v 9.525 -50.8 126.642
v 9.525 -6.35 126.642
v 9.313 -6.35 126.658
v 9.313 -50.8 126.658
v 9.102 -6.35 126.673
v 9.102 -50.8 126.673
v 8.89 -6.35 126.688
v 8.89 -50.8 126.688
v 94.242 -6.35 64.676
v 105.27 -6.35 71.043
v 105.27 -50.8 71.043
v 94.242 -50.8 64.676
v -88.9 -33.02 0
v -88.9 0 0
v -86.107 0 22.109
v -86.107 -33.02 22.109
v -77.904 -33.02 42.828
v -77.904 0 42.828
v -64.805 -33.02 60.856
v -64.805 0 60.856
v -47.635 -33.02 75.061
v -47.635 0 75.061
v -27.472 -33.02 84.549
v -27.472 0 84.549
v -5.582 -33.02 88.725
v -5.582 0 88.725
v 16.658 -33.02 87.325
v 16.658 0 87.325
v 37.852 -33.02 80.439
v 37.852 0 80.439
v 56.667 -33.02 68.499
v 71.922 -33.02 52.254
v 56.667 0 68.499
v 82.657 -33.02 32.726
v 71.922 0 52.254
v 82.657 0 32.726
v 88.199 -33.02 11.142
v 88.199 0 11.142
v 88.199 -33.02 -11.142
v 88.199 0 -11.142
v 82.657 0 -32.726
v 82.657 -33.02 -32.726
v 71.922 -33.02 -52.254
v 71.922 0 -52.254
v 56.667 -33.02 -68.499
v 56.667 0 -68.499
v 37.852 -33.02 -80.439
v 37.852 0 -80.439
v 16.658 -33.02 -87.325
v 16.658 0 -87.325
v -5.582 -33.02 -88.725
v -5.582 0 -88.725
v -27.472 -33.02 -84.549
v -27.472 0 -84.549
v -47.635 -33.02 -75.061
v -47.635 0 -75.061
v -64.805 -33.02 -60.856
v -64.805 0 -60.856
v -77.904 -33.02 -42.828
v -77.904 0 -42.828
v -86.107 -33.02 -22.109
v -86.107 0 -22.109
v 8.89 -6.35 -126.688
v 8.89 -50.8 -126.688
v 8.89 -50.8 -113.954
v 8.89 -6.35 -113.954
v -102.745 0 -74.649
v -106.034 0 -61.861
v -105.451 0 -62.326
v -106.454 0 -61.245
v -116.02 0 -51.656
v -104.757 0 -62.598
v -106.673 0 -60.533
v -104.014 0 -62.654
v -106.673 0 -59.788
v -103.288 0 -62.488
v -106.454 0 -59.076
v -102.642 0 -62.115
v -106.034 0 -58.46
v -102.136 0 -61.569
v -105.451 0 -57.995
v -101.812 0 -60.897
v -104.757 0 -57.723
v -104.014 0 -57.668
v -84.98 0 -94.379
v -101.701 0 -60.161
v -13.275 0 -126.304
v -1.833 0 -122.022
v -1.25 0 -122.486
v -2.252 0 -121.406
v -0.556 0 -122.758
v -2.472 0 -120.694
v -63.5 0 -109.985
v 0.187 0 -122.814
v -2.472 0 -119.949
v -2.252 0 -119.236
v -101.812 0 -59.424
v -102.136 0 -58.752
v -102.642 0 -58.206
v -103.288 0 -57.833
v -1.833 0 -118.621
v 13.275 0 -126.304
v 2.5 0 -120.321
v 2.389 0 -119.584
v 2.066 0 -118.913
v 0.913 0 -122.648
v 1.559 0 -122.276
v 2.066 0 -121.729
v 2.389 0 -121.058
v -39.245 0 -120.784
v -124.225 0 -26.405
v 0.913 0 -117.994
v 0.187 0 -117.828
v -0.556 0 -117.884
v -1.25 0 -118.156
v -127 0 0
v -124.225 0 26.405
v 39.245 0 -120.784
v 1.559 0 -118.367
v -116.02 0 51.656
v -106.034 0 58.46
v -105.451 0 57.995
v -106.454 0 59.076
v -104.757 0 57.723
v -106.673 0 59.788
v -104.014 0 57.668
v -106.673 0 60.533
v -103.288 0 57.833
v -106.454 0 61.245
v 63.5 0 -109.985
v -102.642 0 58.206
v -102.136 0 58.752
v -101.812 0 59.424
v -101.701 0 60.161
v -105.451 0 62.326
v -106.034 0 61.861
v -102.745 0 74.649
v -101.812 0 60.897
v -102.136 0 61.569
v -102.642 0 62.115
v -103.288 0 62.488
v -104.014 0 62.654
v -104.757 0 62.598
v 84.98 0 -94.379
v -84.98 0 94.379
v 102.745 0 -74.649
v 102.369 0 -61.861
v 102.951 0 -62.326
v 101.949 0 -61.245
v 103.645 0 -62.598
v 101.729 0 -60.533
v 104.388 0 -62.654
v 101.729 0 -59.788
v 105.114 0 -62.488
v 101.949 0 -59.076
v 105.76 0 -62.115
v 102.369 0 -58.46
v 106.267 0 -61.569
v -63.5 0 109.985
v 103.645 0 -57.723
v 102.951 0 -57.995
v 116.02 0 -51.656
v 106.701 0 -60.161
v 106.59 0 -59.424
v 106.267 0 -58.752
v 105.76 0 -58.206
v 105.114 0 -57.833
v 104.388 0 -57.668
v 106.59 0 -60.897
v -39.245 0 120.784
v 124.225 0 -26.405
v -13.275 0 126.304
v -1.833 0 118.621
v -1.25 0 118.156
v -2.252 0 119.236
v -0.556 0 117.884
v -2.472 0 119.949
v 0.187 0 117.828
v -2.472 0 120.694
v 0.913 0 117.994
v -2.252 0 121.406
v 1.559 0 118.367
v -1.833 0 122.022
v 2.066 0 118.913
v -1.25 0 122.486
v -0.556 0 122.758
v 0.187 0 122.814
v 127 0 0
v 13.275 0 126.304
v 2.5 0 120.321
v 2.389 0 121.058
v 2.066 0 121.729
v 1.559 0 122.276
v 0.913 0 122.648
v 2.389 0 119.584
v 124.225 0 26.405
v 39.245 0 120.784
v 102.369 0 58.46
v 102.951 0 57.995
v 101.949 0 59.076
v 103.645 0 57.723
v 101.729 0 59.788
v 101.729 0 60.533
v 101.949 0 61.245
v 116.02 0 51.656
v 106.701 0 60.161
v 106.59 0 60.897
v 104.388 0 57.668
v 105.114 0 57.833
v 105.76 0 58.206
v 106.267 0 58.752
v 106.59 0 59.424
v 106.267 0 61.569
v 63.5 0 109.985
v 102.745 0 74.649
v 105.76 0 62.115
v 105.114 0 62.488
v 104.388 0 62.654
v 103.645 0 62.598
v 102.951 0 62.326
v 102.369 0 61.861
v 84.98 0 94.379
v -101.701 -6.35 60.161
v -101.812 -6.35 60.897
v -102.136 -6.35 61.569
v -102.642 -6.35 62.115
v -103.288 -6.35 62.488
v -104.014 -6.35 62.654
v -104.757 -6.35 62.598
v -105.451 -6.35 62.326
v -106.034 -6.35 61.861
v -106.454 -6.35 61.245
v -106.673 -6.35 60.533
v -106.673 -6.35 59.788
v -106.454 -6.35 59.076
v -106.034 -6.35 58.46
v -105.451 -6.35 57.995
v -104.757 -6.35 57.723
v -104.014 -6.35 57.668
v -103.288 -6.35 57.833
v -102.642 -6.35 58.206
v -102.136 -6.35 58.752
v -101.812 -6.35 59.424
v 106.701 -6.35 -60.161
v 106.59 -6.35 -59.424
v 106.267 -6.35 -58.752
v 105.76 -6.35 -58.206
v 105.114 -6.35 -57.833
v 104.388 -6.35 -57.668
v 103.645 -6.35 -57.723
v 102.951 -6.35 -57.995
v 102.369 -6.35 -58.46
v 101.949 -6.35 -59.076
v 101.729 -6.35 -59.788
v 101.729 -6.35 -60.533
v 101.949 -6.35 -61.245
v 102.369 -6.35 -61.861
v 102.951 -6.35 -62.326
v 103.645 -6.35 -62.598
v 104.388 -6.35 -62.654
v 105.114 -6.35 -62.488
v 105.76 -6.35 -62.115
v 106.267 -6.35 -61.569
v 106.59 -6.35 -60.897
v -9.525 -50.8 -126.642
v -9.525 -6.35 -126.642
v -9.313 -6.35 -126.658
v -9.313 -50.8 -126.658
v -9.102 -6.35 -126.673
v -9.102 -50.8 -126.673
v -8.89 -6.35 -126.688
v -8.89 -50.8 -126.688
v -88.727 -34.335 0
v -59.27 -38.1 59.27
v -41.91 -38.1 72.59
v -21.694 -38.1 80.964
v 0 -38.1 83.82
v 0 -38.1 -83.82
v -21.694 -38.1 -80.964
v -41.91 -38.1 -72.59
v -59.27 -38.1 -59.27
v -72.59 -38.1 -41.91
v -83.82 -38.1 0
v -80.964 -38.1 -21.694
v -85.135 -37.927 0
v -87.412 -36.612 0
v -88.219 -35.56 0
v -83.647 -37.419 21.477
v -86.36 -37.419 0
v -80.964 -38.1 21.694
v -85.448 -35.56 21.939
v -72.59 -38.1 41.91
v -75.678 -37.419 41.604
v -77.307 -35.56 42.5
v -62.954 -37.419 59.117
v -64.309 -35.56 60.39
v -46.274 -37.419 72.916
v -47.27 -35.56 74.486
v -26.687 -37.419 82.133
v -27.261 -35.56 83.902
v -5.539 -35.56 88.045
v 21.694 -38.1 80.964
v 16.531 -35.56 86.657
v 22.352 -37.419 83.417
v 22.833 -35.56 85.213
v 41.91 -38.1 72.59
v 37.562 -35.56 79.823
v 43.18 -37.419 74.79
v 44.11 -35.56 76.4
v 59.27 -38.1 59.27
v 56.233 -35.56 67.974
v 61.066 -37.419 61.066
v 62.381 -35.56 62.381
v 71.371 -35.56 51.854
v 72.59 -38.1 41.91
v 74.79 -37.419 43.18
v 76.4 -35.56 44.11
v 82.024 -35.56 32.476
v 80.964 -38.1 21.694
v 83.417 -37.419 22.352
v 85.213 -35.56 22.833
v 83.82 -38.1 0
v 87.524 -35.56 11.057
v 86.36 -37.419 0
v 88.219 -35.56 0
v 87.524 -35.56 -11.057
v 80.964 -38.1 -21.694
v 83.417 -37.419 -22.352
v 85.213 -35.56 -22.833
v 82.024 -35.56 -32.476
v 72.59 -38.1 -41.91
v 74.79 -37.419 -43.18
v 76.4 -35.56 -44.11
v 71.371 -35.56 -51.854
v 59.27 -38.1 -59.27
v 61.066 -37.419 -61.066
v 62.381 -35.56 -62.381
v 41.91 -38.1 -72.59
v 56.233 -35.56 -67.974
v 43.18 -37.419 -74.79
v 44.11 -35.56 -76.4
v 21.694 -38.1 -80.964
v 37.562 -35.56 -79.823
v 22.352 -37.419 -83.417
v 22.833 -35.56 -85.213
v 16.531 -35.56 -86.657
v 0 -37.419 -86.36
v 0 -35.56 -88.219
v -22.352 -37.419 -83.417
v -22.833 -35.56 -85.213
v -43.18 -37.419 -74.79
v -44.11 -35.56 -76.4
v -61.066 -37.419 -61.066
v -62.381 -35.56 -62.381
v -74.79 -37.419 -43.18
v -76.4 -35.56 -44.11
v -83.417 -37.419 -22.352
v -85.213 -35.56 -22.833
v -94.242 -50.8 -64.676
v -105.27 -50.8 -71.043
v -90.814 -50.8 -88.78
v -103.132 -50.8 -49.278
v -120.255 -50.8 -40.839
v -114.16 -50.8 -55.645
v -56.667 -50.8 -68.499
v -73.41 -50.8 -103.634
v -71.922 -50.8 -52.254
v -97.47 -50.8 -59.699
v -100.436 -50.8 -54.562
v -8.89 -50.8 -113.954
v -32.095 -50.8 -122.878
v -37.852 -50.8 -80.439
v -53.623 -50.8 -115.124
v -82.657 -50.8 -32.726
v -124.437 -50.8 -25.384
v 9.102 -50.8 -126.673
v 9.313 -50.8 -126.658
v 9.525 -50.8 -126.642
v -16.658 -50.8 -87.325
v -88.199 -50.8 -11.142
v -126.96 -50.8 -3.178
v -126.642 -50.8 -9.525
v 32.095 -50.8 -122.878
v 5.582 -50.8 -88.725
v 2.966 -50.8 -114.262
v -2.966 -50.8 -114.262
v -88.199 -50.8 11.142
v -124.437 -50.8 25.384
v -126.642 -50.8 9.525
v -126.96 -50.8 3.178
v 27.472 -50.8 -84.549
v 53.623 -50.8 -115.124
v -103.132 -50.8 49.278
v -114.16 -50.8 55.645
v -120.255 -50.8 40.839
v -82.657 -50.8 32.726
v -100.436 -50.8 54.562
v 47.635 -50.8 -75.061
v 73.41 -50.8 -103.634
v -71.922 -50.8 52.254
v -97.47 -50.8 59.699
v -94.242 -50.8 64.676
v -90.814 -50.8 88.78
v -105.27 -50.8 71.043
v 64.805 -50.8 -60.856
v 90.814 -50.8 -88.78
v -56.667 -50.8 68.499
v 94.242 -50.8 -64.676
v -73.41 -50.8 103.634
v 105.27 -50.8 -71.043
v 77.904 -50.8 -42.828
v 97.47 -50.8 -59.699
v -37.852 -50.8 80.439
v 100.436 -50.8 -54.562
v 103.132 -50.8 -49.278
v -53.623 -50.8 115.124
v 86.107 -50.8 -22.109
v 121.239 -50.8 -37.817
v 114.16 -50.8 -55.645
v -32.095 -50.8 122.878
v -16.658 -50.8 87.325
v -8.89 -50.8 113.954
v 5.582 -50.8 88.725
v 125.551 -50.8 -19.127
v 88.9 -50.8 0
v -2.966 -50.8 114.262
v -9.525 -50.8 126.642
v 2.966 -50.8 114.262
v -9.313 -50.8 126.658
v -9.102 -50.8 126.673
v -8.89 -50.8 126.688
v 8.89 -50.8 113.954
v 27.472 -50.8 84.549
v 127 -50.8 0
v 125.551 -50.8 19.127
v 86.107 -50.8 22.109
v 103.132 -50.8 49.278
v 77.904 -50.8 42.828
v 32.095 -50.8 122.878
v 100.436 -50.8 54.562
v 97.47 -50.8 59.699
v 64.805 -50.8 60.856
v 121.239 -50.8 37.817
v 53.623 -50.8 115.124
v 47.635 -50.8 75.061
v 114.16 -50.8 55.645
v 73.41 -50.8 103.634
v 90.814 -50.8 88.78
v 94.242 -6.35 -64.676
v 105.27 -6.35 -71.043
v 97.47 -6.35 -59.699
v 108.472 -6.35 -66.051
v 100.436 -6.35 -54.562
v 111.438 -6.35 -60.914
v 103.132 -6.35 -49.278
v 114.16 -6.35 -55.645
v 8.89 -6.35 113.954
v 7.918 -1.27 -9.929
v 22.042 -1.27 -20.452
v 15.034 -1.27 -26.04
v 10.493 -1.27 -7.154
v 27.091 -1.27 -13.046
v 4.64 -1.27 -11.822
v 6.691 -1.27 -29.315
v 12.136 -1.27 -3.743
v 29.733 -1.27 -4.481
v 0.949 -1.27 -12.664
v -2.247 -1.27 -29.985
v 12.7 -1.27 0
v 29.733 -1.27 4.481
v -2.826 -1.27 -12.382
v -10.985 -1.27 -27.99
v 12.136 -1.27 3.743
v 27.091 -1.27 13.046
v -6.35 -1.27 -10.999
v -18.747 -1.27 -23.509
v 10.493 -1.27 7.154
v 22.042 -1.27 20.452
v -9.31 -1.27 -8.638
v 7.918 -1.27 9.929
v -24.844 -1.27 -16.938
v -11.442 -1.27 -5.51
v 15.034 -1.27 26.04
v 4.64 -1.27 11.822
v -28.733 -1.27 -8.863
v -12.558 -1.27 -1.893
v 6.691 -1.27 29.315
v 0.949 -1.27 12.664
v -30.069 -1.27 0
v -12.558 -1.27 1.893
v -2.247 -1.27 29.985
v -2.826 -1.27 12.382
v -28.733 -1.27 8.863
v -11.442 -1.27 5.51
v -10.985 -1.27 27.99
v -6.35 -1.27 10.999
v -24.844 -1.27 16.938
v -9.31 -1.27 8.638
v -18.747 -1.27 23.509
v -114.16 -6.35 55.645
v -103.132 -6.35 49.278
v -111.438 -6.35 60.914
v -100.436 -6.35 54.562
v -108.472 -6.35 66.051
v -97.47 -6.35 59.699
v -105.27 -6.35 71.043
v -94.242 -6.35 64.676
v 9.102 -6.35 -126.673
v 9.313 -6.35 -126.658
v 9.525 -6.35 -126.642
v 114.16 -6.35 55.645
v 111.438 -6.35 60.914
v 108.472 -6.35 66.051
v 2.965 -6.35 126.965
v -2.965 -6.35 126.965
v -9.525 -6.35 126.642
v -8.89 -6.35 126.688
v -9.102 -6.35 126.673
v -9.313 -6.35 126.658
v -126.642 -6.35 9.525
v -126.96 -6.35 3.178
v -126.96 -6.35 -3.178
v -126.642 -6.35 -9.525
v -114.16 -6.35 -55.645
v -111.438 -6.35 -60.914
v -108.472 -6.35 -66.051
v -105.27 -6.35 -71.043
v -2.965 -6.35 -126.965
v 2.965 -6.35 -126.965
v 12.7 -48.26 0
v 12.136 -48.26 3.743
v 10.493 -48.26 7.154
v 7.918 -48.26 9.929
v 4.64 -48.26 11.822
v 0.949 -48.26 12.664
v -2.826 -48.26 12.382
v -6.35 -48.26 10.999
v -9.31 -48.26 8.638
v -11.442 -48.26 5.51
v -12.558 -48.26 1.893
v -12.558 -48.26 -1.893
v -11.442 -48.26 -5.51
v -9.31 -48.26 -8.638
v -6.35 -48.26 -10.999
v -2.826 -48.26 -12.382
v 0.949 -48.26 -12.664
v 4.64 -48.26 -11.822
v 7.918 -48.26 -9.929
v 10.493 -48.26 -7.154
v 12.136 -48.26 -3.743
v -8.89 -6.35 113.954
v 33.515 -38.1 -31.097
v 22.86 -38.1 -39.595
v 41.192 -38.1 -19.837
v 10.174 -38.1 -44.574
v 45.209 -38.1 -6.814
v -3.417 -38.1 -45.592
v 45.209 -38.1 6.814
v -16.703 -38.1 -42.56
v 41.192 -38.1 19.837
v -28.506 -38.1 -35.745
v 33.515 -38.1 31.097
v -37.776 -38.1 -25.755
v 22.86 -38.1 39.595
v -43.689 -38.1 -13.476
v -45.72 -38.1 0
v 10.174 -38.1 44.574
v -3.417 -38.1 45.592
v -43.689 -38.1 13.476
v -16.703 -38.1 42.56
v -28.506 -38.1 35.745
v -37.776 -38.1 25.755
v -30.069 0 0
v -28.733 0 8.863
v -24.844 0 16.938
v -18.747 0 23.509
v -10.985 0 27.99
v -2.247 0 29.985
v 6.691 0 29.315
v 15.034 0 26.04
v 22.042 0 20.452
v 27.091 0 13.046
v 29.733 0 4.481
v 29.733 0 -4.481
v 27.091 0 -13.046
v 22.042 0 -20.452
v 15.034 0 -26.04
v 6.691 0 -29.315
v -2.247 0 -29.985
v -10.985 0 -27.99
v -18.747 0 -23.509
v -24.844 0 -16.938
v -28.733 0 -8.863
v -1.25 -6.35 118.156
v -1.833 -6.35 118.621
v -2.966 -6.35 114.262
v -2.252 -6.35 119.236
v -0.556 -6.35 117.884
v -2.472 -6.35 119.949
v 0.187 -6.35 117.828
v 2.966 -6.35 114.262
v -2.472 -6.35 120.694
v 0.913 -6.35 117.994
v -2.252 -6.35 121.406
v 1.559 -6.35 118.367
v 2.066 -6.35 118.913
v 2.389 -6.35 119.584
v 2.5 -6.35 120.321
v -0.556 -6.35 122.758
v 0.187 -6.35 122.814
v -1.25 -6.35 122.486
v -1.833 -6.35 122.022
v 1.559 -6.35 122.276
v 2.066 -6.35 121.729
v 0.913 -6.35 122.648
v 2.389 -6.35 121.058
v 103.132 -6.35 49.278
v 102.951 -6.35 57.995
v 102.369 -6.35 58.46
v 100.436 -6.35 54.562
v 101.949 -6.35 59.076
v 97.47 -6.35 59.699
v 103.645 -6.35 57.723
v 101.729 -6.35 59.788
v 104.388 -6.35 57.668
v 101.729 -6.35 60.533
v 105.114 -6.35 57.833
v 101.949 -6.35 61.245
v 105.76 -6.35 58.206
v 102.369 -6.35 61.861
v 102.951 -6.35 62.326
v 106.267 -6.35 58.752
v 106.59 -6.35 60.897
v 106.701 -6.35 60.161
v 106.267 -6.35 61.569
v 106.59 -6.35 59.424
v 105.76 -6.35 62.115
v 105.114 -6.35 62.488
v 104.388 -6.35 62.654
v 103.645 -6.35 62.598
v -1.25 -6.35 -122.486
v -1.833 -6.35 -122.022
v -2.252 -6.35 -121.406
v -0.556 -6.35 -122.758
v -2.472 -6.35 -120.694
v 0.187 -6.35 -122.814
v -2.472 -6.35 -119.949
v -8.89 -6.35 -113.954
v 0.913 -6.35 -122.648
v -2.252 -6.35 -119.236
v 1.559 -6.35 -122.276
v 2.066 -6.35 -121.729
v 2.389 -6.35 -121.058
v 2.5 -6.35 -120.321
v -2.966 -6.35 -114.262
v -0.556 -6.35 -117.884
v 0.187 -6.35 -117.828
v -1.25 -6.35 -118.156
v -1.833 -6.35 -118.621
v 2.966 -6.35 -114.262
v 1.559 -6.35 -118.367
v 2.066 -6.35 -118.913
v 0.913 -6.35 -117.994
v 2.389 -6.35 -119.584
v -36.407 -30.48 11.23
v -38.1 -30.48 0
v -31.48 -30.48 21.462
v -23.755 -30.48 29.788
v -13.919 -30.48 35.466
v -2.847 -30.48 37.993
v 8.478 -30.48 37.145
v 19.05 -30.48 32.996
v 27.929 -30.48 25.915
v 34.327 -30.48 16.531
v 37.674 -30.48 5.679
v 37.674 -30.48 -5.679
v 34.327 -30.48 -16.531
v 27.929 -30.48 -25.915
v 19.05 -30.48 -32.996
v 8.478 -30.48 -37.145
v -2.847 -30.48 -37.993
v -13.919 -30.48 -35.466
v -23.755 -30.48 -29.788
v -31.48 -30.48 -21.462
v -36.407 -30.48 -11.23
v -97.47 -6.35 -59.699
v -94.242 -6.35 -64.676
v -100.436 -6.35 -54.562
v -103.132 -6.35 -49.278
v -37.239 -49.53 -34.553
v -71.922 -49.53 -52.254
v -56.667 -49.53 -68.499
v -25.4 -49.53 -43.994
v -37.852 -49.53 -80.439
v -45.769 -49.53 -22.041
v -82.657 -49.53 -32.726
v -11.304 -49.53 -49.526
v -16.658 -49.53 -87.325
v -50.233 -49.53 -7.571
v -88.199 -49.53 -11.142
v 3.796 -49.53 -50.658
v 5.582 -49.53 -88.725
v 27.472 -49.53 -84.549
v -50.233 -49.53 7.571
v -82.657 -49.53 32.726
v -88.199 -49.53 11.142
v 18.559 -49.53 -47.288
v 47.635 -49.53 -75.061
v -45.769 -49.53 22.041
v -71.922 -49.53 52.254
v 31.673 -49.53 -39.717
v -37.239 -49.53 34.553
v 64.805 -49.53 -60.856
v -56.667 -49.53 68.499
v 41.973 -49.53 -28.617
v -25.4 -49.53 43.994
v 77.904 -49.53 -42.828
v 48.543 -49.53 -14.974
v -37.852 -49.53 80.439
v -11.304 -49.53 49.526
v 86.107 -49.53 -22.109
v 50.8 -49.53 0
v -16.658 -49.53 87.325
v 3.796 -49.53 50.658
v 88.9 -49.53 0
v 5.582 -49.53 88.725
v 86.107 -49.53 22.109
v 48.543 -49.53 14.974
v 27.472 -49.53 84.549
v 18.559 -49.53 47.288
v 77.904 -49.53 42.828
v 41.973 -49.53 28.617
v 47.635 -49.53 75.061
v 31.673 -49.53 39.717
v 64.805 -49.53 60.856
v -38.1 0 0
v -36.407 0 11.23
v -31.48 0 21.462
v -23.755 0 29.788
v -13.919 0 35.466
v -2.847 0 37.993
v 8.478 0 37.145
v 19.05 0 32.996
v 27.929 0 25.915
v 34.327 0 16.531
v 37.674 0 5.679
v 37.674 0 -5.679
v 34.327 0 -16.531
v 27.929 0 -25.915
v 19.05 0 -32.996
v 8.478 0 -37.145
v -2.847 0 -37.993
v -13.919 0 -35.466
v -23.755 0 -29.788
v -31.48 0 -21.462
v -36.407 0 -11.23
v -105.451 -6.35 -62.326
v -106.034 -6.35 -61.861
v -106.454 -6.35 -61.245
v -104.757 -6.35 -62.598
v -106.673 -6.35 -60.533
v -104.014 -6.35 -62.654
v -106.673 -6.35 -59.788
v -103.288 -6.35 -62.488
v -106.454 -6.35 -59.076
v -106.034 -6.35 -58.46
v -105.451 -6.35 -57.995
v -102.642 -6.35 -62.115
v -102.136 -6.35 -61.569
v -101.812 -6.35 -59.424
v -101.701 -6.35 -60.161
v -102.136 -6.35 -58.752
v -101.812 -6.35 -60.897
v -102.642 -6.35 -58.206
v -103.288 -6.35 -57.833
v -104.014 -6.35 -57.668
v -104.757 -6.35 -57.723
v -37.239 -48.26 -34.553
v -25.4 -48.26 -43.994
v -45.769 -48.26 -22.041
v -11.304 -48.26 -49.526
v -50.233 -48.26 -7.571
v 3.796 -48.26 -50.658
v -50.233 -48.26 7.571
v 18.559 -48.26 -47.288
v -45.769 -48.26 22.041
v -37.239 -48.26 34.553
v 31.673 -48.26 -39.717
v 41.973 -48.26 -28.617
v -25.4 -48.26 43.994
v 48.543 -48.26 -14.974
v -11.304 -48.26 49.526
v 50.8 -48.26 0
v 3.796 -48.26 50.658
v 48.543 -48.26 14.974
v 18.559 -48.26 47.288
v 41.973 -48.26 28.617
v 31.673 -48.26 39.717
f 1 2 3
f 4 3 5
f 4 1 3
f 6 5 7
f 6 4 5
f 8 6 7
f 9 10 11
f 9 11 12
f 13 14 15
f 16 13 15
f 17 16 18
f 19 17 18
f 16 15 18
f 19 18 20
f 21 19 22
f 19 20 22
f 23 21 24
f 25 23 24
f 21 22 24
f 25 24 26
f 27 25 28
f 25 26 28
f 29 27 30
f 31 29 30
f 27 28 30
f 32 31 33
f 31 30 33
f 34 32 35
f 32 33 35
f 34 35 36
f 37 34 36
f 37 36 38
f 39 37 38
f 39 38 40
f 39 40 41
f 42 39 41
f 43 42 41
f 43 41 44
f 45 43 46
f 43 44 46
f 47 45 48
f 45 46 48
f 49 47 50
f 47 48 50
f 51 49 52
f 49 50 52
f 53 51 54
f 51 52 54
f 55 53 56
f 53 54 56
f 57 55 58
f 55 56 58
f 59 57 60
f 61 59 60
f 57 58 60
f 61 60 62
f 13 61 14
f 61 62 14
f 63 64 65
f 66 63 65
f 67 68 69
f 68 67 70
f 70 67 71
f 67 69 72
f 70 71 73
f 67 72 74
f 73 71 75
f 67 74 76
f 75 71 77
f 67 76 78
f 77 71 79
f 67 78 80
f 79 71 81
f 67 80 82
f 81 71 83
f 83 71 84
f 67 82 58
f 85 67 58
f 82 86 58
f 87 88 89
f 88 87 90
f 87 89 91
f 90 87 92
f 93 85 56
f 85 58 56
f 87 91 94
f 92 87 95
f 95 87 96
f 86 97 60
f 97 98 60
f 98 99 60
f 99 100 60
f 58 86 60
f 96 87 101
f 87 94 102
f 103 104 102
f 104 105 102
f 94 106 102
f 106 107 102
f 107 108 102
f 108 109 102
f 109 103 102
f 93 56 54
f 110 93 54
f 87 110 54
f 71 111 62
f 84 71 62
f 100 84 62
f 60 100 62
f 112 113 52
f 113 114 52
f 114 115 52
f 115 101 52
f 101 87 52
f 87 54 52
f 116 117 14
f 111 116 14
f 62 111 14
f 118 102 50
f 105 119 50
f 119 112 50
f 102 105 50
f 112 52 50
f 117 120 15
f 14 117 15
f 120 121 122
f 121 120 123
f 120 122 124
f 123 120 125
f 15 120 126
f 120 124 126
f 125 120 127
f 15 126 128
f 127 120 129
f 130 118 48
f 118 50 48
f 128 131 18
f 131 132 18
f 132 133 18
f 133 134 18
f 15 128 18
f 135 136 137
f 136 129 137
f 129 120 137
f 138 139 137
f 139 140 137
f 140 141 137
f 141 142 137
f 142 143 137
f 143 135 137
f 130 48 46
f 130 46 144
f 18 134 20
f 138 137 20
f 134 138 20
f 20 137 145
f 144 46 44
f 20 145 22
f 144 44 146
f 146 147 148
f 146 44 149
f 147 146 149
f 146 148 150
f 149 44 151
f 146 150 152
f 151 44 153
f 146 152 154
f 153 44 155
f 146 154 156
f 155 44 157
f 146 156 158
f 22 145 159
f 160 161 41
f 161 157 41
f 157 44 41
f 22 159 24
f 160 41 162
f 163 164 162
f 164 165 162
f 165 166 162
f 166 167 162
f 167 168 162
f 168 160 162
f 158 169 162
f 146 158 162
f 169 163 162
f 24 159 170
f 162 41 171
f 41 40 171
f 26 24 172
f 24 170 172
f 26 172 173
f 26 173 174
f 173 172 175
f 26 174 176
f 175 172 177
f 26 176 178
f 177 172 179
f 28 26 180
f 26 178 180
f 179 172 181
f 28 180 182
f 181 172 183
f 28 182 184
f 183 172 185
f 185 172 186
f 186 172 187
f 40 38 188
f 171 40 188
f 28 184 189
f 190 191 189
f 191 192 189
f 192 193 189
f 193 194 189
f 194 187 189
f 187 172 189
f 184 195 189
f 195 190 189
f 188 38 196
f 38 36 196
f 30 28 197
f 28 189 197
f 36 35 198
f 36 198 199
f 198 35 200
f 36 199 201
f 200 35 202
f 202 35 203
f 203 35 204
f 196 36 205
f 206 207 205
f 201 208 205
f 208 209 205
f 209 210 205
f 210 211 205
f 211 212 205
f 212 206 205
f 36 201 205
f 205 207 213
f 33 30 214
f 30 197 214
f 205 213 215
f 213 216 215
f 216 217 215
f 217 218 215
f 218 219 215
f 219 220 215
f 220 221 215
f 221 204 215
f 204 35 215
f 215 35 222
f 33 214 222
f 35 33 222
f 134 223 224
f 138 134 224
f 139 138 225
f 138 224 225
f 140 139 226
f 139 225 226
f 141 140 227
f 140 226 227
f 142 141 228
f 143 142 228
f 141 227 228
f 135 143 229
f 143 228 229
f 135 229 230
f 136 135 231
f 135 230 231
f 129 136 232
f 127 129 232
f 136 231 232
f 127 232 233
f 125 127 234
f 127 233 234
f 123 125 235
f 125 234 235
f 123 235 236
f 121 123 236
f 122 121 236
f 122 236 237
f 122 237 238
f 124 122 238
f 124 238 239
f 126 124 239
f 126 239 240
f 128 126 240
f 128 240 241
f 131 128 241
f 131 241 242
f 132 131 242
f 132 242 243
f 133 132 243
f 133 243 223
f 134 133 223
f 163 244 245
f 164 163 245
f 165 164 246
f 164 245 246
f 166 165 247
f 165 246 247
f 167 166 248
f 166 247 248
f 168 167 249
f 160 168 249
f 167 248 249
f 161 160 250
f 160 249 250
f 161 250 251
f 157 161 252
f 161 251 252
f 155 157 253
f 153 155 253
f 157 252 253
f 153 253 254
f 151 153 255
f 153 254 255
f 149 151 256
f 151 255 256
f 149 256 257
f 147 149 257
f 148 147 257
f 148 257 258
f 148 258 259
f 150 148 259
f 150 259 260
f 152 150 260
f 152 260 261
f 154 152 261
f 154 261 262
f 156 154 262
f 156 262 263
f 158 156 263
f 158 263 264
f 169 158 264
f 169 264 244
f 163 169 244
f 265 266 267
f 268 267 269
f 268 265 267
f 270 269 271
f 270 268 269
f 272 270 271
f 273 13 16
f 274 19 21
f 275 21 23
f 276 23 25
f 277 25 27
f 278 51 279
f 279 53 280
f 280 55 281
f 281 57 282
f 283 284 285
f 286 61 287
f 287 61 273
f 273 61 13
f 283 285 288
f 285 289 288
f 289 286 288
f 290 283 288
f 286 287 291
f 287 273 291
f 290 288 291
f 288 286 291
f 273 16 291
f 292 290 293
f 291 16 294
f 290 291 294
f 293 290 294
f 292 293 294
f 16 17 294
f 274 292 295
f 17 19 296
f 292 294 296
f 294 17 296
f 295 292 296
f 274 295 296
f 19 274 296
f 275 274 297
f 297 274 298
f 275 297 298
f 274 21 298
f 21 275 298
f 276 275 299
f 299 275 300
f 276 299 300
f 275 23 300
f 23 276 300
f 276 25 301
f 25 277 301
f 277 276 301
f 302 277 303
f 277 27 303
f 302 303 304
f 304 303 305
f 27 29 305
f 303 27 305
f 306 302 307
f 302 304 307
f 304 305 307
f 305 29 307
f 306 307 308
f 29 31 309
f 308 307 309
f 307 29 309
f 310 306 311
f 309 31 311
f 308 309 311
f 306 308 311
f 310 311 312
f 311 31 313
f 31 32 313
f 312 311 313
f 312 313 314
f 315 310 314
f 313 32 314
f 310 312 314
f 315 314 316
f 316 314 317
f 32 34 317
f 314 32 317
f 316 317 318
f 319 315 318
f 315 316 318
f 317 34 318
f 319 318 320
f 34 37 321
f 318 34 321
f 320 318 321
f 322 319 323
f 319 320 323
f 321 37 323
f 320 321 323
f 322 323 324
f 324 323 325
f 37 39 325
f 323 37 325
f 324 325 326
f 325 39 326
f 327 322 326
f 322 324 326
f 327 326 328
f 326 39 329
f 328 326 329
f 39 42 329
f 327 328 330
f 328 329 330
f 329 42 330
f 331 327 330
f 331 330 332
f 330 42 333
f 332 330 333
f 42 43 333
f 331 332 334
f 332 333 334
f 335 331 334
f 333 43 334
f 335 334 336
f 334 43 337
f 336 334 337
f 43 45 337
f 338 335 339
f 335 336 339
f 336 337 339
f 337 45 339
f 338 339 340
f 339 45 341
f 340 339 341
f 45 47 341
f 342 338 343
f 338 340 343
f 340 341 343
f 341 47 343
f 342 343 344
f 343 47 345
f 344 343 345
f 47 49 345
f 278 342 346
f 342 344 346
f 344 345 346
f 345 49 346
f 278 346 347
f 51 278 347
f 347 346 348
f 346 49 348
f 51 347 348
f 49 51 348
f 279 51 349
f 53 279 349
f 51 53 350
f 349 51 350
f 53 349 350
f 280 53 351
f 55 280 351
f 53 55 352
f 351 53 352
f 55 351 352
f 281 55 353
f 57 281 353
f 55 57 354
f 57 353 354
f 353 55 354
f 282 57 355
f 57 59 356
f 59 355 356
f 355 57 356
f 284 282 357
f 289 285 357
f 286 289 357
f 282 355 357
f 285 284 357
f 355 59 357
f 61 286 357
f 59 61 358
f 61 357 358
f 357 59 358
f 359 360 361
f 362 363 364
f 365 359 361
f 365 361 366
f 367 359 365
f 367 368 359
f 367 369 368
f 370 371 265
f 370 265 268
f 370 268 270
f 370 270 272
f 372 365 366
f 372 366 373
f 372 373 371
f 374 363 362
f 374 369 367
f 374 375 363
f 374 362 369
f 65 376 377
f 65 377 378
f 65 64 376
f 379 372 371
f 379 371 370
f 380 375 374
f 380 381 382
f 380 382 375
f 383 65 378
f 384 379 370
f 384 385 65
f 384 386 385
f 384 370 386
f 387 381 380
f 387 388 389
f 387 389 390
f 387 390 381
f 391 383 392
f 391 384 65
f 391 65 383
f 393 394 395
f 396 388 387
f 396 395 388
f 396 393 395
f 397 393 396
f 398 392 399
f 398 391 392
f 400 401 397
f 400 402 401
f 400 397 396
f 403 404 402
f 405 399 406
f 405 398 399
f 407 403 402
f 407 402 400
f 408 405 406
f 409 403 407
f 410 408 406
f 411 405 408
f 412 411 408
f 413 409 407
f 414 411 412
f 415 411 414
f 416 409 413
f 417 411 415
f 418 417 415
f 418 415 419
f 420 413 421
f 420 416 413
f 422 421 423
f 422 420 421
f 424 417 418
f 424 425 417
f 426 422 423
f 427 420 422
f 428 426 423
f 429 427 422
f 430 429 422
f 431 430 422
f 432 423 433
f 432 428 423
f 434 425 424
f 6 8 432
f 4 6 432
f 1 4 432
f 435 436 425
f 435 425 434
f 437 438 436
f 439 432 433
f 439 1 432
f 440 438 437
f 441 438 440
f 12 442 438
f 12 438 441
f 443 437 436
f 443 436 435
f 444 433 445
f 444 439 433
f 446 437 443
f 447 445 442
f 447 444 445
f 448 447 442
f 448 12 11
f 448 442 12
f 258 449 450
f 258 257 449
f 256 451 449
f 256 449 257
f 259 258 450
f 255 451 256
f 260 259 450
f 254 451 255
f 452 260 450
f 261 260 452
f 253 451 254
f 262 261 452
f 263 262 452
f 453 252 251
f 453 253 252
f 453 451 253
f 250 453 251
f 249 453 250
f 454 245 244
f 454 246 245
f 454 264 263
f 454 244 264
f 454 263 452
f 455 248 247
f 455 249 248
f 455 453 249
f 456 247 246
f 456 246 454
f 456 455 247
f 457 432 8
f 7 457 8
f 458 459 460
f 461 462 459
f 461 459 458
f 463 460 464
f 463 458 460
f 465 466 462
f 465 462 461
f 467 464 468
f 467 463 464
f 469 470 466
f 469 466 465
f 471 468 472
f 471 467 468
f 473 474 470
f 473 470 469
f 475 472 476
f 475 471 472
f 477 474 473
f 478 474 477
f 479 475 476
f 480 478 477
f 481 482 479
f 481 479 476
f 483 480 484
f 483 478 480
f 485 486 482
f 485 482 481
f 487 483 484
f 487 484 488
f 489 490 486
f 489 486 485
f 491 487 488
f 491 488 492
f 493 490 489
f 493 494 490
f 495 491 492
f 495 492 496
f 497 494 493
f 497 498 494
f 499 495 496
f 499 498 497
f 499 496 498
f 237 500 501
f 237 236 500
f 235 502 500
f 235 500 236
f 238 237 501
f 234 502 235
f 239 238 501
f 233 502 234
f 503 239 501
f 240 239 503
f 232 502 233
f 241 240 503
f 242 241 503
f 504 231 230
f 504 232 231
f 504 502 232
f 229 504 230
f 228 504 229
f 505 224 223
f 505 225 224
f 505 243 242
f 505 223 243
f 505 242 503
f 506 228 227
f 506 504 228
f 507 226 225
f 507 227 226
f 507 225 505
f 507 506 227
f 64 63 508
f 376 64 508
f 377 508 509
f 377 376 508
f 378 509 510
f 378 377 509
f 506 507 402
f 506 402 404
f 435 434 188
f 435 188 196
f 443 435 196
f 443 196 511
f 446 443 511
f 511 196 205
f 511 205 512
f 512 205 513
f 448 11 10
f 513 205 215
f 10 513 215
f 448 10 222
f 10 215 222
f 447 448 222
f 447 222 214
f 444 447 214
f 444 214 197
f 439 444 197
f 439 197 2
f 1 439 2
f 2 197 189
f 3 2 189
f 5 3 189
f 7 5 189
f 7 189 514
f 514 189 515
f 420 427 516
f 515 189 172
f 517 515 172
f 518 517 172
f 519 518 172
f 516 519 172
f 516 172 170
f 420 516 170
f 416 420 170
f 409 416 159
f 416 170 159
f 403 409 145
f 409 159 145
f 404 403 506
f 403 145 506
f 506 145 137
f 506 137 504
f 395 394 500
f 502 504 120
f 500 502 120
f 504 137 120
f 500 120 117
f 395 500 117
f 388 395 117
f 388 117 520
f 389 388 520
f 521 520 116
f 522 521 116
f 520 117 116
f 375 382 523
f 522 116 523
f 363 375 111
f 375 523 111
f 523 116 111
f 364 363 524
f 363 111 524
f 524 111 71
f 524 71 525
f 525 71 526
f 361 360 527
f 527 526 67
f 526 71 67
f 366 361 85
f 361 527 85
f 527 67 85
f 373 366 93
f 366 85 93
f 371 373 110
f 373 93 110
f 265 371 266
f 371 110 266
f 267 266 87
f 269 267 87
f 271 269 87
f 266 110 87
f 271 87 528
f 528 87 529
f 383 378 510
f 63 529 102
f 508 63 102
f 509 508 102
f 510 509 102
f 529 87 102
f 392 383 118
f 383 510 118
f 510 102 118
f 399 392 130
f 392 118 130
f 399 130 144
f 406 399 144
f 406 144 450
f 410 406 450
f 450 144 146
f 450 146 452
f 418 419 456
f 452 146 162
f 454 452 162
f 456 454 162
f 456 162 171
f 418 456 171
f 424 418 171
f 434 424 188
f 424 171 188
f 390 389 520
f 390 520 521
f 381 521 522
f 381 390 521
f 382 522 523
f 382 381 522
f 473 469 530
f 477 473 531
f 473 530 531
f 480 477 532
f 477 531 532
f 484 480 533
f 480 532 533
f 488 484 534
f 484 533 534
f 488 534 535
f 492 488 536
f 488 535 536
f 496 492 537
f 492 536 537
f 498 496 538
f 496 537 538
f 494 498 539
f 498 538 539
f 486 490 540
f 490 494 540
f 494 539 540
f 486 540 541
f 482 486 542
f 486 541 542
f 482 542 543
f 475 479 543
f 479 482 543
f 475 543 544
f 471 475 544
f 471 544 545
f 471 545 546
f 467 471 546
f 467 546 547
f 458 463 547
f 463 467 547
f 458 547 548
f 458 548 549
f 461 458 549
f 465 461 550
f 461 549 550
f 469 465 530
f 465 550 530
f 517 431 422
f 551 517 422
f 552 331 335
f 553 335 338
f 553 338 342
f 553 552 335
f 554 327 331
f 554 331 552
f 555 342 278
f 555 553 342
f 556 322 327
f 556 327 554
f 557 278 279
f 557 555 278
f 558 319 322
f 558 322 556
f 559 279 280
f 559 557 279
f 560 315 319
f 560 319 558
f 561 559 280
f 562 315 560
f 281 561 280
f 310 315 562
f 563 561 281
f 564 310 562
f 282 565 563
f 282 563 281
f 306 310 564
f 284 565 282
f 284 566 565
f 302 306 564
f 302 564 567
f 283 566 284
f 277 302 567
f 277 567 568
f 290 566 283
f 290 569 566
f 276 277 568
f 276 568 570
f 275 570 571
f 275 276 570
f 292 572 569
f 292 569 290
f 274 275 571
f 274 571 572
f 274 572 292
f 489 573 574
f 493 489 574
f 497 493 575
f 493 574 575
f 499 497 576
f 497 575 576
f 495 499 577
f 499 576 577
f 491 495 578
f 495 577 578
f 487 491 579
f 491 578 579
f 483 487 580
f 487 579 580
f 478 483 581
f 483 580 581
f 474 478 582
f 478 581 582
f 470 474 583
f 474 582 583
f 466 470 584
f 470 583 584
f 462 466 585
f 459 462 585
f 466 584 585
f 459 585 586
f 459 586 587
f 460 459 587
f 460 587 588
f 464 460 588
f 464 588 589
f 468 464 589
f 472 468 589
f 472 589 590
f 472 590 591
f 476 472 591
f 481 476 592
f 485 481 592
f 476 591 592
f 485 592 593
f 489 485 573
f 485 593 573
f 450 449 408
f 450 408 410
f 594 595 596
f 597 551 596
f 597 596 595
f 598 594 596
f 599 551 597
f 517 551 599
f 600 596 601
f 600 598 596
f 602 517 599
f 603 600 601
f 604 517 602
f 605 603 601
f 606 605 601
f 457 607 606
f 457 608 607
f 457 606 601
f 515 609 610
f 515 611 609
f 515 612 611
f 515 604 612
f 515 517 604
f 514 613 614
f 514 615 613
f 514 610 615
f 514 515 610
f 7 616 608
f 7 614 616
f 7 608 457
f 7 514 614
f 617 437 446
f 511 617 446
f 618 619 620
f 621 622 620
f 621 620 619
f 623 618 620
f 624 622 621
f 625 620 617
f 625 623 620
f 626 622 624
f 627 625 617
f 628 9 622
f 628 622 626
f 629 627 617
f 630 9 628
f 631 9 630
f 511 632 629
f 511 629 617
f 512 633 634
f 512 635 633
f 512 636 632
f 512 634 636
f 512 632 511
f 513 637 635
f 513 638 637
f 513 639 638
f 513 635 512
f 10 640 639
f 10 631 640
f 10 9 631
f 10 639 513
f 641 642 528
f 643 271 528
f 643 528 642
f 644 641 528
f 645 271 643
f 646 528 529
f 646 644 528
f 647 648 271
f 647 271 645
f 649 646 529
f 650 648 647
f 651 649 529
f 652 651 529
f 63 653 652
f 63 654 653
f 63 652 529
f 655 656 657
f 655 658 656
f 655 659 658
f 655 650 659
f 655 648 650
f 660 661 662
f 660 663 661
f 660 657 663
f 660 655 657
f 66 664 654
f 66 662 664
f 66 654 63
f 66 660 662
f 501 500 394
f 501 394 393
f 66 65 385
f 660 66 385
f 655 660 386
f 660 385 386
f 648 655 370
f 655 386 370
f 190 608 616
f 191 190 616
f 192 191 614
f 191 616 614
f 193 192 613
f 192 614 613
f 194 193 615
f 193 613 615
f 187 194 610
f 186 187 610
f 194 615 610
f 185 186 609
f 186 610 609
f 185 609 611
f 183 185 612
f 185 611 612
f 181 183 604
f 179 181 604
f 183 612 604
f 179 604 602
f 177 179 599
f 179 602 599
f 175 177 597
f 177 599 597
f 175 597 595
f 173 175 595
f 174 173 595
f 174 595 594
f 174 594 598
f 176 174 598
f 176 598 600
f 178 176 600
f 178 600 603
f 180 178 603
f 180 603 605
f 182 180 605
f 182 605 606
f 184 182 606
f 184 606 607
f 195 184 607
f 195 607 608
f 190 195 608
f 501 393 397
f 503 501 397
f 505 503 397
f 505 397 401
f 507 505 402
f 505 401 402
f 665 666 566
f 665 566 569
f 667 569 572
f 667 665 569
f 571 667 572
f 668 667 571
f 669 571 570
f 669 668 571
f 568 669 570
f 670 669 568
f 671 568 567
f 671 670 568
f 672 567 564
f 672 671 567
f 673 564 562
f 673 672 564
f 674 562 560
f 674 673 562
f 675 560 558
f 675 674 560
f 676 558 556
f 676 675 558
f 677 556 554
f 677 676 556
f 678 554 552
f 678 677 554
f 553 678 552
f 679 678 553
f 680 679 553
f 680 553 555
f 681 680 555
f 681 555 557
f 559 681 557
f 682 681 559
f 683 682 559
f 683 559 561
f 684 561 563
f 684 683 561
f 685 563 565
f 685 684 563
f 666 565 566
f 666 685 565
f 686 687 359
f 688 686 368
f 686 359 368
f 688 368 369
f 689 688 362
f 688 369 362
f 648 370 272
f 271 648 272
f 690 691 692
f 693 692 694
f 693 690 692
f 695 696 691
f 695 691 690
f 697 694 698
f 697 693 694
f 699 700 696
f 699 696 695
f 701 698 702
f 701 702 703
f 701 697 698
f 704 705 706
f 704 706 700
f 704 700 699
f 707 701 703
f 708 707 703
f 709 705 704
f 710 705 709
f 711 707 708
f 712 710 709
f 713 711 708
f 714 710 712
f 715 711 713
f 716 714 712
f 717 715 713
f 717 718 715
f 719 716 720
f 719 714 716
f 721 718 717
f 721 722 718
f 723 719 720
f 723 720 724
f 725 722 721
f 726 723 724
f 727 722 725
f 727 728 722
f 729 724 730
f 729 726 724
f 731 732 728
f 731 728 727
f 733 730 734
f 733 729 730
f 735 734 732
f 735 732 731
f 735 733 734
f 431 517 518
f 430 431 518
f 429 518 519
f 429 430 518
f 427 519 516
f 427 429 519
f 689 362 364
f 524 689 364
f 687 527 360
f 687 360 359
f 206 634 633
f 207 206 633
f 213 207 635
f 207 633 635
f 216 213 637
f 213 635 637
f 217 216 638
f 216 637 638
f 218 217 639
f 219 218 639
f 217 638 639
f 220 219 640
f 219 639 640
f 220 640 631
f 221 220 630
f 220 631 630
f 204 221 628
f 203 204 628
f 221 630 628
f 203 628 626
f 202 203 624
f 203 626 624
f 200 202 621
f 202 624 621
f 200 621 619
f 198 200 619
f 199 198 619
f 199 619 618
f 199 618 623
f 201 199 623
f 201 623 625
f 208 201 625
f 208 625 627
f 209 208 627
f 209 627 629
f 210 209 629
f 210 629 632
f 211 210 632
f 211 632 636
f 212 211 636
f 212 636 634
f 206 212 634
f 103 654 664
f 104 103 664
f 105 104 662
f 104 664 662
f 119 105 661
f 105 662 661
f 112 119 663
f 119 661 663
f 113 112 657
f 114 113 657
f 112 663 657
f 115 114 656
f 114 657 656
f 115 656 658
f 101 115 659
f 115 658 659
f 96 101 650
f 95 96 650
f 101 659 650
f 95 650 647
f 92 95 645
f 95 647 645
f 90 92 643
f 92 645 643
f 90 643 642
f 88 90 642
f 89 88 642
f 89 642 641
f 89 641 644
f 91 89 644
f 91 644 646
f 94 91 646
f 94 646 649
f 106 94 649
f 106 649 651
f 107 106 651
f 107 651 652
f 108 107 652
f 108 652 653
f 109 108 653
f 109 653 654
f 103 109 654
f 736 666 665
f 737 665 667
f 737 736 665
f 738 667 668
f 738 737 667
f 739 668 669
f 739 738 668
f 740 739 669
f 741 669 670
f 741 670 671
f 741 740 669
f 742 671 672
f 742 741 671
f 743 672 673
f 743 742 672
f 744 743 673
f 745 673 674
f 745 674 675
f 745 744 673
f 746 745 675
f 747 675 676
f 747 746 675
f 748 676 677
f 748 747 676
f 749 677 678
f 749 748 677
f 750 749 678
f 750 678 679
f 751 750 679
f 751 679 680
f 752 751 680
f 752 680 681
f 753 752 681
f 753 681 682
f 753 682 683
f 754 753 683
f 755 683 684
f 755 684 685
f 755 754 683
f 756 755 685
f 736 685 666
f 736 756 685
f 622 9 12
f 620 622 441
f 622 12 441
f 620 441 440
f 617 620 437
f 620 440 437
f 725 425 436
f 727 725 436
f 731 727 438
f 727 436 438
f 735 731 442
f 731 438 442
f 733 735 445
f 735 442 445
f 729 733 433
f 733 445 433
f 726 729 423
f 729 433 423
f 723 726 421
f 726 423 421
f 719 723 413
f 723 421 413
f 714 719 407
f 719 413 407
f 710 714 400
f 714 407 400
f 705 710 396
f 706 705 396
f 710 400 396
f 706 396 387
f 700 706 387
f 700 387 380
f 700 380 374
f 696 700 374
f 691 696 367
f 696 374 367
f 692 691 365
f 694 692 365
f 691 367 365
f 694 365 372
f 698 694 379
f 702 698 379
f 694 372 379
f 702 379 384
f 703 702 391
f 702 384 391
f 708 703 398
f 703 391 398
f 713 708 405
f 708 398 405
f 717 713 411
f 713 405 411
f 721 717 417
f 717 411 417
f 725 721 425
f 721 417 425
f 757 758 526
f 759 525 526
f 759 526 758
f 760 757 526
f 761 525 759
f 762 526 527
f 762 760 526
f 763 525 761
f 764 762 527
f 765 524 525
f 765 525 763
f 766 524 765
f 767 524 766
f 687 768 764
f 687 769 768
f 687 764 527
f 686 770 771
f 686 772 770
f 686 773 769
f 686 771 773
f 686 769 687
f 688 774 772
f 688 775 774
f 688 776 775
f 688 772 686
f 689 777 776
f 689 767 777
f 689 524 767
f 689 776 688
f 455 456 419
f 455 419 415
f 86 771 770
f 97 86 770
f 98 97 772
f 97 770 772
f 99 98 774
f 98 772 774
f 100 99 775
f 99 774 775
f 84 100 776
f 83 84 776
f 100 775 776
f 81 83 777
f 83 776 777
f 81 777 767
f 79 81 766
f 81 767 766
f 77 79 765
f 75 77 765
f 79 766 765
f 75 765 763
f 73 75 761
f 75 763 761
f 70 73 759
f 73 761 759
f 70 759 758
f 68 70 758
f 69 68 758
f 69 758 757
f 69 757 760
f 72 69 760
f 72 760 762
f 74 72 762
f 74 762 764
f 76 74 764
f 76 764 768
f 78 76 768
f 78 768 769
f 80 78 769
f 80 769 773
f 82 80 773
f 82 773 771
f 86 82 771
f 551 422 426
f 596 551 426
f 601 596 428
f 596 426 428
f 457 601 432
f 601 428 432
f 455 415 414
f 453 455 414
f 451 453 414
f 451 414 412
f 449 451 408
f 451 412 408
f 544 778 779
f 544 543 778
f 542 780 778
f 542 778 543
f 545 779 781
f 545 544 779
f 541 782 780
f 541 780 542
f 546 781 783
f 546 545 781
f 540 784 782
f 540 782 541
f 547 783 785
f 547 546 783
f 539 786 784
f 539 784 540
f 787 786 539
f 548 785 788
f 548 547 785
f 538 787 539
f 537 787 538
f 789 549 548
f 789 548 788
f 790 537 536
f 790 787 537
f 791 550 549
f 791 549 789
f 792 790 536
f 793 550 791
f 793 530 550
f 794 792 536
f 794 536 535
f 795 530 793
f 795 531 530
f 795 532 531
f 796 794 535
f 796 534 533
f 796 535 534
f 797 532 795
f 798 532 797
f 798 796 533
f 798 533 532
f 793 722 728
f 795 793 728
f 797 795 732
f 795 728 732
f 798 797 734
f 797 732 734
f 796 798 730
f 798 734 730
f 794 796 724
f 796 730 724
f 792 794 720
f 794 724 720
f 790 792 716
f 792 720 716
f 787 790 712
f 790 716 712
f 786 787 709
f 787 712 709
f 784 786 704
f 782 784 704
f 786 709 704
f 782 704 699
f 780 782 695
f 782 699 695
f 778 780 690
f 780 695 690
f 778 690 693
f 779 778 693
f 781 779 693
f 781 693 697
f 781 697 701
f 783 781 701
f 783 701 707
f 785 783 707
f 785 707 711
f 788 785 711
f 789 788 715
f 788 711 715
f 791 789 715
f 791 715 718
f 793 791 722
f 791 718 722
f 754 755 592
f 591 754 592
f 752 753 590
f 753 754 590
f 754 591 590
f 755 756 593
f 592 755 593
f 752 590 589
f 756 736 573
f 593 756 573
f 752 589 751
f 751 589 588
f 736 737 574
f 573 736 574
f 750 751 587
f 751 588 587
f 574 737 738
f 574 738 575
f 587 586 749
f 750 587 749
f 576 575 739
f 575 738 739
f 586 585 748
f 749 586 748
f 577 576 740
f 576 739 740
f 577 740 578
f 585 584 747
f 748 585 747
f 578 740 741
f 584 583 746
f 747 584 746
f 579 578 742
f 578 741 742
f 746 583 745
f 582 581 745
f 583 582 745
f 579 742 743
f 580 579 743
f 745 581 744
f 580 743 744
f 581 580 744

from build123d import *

# Parameters (mm, degrees)
F0_R      = 127
F1_DEPTH  = 50.8
F2_R      = 88.9
F3_DEPTH  = 1.27
F4_R      = 12.7
F5_DEPTH  = 50.8
F6_R      = 50.8
F7_DEPTH  = 1.27
F8_R      = 88.9
F8_R_2    = 38.1
F9_DEPTH  = 38.1
F10_SIZE  = 7.62
F11_R     = 5.08
F13_DEPTH = 44.45
F14_R     = 30.068591
F14_R_2   = 12.7
F15_DEPTH = 1.27
F17_DEPTH = 44.45
F18_R     = 2.5
F19_DEPTH = 25.4


with BuildPart() as f1:
    # F0 (on Front) → F1 (new body)
    with BuildSketch(Plane.XZ):
        Circle(F0_R)
    extrude(amount=F1_DEPTH)

    # F2 (on face) → F3 (cut)
    with BuildSketch(Plane.XZ.offset(50.8)):
        Circle(F2_R)
    extrude(amount=-F3_DEPTH, mode=Mode.SUBTRACT)

    # F4 (on face) → F5 (cut)
    with BuildSketch(Plane.XZ.offset(49.53)):
        Circle(F4_R)
    extrude(amount=-F5_DEPTH, mode=Mode.SUBTRACT)

    # F6 (on face) → F7 (cut)
    with BuildSketch(Plane.XZ.offset(49.53)):
        Circle(F6_R)
    extrude(amount=-F7_DEPTH, mode=Mode.SUBTRACT)

    # F8 (on face) → F9 (cut)
    with BuildSketch(Plane(origin=(0, 0, 0), x_dir=(-1, 0, 0), z_dir=(0, 1, 0))):
        Circle(F8_R)
        Circle(F8_R_2, mode=Mode.SUBTRACT)
    extrude(amount=-F9_DEPTH, mode=Mode.SUBTRACT)

    # F10
    f10_edges = [f1.edges().sort_by_distance(p)[0] for p in [
        (38.1, -38.1, 0),
    ]]
    chamfer(f10_edges, length=F10_SIZE)

    # F11
    f11_edges = [f1.edges().sort_by_distance(p)[0] for p in [
        (88.9, -38.1, 0),
    ]]
    fillet(f11_edges, radius=F11_R)

    # F12 (on face) → F13 (join)
    with BuildSketch(Plane.XZ.offset(50.8)):
        with BuildLine():
            ThreePointArc((-2.998611, 107.908345), (0, 107.95), (2.998611, 107.908345))
            ThreePointArc((2.998611, 107.908345), (7.602326, 109.70383), (9.525, 114.255894))
            Line((9.525, 114.255894), (9.525, 126.642309))
            ThreePointArc((9.525, 126.642309), (0, 127), (-9.525, 126.642309))
            Line((-9.525, 126.642309), (-9.525, 114.255894))
            ThreePointArc((-9.525, 114.255894), (-7.602326, 109.70383), (-2.998611, 107.908345))
        make_face()
        with BuildLine():
            Line((-74.055926, 87.52631), (-82.814443, 96.284827))
            ThreePointArc((-82.814443, 96.284827), (-89.802561, 89.802561), (-96.284827, 82.814443))
            Line((-96.284827, 82.814443), (-87.52631, 74.055926))
            ThreePointArc((-87.52631, 74.055926), (-82.947979, 72.196666), (-78.42306, 74.182384))
            ThreePointArc((-78.42306, 74.182384), (-76.332177, 76.332177), (-74.182384, 78.42306))
            ThreePointArc((-74.182384, 78.42306), (-72.196666, 82.947979), (-74.055926, 87.52631))
        make_face()
        with BuildLine():
            Line((-114.255894, 9.525), (-126.642309, 9.525))
            ThreePointArc((-126.642309, 9.525), (-127, 0), (-126.642309, -9.525))
            Line((-126.642309, -9.525), (-114.255894, -9.525))
            ThreePointArc((-114.255894, -9.525), (-109.70383, -7.602326), (-107.908345, -2.998611))
            ThreePointArc((-107.908345, -2.998611), (-107.95, 0), (-107.908345, 2.998611))
            ThreePointArc((-107.908345, 2.998611), (-109.70383, 7.602326), (-114.255894, 9.525))
        make_face()
        with BuildLine():
            Line((-87.52631, -74.055926), (-96.284827, -82.814443))
            ThreePointArc((-96.284827, -82.814443), (-89.802561, -89.802561), (-82.814443, -96.284827))
            Line((-82.814443, -96.284827), (-74.055926, -87.52631))
            ThreePointArc((-74.055926, -87.52631), (-72.196666, -82.947979), (-74.182384, -78.42306))
            ThreePointArc((-74.182384, -78.42306), (-76.332177, -76.332177), (-78.42306, -74.182384))
            ThreePointArc((-78.42306, -74.182384), (-82.947979, -72.196666), (-87.52631, -74.055926))
        make_face()
        with BuildLine():
            Line((-9.525, -114.255894), (-9.525, -126.642309))
            ThreePointArc((-9.525, -126.642309), (0, -127), (9.525, -126.642309))
            Line((9.525, -126.642309), (9.525, -114.255894))
            ThreePointArc((9.525, -114.255894), (7.602326, -109.70383), (2.998611, -107.908345))
            ThreePointArc((2.998611, -107.908345), (0, -107.95), (-2.998611, -107.908345))
            ThreePointArc((-2.998611, -107.908345), (-7.602326, -109.70383), (-9.525, -114.255894))
        make_face()
        with BuildLine():
            Line((74.055926, -87.52631), (82.814443, -96.284827))
            ThreePointArc((82.814443, -96.284827), (89.802561, -89.802561), (96.284827, -82.814443))
            Line((96.284827, -82.814443), (87.52631, -74.055926))
            ThreePointArc((87.52631, -74.055926), (82.947979, -72.196666), (78.42306, -74.182384))
            ThreePointArc((78.42306, -74.182384), (76.332177, -76.332177), (74.182384, -78.42306))
            ThreePointArc((74.182384, -78.42306), (72.196666, -82.947979), (74.055926, -87.52631))
        make_face()
        with BuildLine():
            Line((114.255894, -9.525), (126.642309, -9.525))
            ThreePointArc((126.642309, -9.525), (127, 0), (126.642309, 9.525))
            Line((126.642309, 9.525), (114.255894, 9.525))
            ThreePointArc((114.255894, 9.525), (109.70383, 7.602326), (107.908345, 2.998611))
            ThreePointArc((107.908345, 2.998611), (107.95, 0), (107.908345, -2.998611))
            ThreePointArc((107.908345, -2.998611), (109.70383, -7.602326), (114.255894, -9.525))
        make_face()
        with BuildLine():
            Line((87.52631, 74.055926), (96.284827, 82.814443))
            ThreePointArc((96.284827, 82.814443), (89.802561, 89.802561), (82.814443, 96.284827))
            Line((82.814443, 96.284827), (74.055926, 87.52631))
            ThreePointArc((74.055926, 87.52631), (72.196666, 82.947979), (74.182384, 78.42306))
            ThreePointArc((74.182384, 78.42306), (76.332177, 76.332177), (78.42306, 74.182384))
            ThreePointArc((78.42306, 74.182384), (82.947979, 72.196666), (87.52631, 74.055926))
        make_face()
    extrude(amount=-F13_DEPTH)

    # F14 (on face) → F15 (cut)
    with BuildSketch(Plane(origin=(0, 0, 0), x_dir=(-1, 0, 0), z_dir=(0, 1, 0))):
        Circle(F14_R)
        Circle(F14_R_2, mode=Mode.SUBTRACT)
    extrude(amount=-F15_DEPTH, mode=Mode.SUBTRACT)

    # F16 (on face) → F17 (cut)
    with BuildSketch(Plane.XZ.offset(50.8)):
        with BuildLine():
            ThreePointArc((-103.131845, 49.277911), (-98.986704, 57.15), (-94.241845, 64.675843))
            Line((-94.241845, 64.675843), (-105.270432, 71.0432))
            ThreePointArc((-105.270432, 71.0432), (-109.985226, 63.5), (-114.160432, 55.645268))
            Line((-114.160432, 55.645268), (-103.131845, 49.277911))
        make_face()
        with BuildLine():
            ThreePointArc((-94.241845, -64.675843), (-98.986704, -57.15), (-103.131845, -49.277911))
            Line((-103.131845, -49.277911), (-114.160432, -55.645268))
            ThreePointArc((-114.160432, -55.645268), (-109.985226, -63.5), (-105.270432, -71.0432))
            Line((-105.270432, -71.0432), (-94.241845, -64.675843))
        make_face()
        with BuildLine():
            ThreePointArc((8.89, -113.953753), (0, -114.3), (-8.89, -113.953753))
            Line((-8.89, -113.953753), (-8.89, -126.688468))
            ThreePointArc((-8.89, -126.688468), (0, -127), (8.89, -126.688468))
            Line((8.89, -126.688468), (8.89, -113.953753))
        make_face()
        with BuildLine():
            ThreePointArc((103.131845, -49.277911), (98.986704, -57.15), (94.241845, -64.675843))
            Line((94.241845, -64.675843), (105.270432, -71.0432))
            ThreePointArc((105.270432, -71.0432), (109.985226, -63.5), (114.160432, -55.645268))
            Line((114.160432, -55.645268), (103.131845, -49.277911))
        make_face()
        with BuildLine():
            ThreePointArc((94.241845, 64.675843), (98.986704, 57.15), (103.131845, 49.277911))
            Line((103.131845, 49.277911), (114.160432, 55.645268))
            ThreePointArc((114.160432, 55.645268), (109.985226, 63.5), (105.270432, 71.0432))
            Line((105.270432, 71.0432), (94.241845, 64.675843))
        make_face()
        with BuildLine():
            Line((8.89, 113.953753), (8.89, 126.688468))
            ThreePointArc((8.89, 126.688468), (0, 127), (-8.89, 126.688468))
            Line((-8.89, 126.688468), (-8.89, 113.953753))
            ThreePointArc((-8.89, 113.953753), (0, 114.3), (8.89, 113.953753))
        make_face()
    extrude(amount=-F17_DEPTH, mode=Mode.SUBTRACT)

    # F18 (on face) → F19 (cut)
    with BuildSketch(Plane.XZ.offset(6.35)):
        with Locations((0, 120.321111)):
            Circle(F18_R)
        with Locations((-104.201138, 60.160555)):
            Circle(F18_R)
        with Locations((-104.201138, -60.160555)):
            Circle(F18_R)
        with Locations((0, -120.321111)):
            Circle(F18_R)
        with Locations((104.201138, -60.160555)):
            Circle(F18_R)
        with Locations((104.201138, 60.160555)):
            Circle(F18_R)
    extrude(amount=-F19_DEPTH, mode=Mode.SUBTRACT)


solid = f1.part
